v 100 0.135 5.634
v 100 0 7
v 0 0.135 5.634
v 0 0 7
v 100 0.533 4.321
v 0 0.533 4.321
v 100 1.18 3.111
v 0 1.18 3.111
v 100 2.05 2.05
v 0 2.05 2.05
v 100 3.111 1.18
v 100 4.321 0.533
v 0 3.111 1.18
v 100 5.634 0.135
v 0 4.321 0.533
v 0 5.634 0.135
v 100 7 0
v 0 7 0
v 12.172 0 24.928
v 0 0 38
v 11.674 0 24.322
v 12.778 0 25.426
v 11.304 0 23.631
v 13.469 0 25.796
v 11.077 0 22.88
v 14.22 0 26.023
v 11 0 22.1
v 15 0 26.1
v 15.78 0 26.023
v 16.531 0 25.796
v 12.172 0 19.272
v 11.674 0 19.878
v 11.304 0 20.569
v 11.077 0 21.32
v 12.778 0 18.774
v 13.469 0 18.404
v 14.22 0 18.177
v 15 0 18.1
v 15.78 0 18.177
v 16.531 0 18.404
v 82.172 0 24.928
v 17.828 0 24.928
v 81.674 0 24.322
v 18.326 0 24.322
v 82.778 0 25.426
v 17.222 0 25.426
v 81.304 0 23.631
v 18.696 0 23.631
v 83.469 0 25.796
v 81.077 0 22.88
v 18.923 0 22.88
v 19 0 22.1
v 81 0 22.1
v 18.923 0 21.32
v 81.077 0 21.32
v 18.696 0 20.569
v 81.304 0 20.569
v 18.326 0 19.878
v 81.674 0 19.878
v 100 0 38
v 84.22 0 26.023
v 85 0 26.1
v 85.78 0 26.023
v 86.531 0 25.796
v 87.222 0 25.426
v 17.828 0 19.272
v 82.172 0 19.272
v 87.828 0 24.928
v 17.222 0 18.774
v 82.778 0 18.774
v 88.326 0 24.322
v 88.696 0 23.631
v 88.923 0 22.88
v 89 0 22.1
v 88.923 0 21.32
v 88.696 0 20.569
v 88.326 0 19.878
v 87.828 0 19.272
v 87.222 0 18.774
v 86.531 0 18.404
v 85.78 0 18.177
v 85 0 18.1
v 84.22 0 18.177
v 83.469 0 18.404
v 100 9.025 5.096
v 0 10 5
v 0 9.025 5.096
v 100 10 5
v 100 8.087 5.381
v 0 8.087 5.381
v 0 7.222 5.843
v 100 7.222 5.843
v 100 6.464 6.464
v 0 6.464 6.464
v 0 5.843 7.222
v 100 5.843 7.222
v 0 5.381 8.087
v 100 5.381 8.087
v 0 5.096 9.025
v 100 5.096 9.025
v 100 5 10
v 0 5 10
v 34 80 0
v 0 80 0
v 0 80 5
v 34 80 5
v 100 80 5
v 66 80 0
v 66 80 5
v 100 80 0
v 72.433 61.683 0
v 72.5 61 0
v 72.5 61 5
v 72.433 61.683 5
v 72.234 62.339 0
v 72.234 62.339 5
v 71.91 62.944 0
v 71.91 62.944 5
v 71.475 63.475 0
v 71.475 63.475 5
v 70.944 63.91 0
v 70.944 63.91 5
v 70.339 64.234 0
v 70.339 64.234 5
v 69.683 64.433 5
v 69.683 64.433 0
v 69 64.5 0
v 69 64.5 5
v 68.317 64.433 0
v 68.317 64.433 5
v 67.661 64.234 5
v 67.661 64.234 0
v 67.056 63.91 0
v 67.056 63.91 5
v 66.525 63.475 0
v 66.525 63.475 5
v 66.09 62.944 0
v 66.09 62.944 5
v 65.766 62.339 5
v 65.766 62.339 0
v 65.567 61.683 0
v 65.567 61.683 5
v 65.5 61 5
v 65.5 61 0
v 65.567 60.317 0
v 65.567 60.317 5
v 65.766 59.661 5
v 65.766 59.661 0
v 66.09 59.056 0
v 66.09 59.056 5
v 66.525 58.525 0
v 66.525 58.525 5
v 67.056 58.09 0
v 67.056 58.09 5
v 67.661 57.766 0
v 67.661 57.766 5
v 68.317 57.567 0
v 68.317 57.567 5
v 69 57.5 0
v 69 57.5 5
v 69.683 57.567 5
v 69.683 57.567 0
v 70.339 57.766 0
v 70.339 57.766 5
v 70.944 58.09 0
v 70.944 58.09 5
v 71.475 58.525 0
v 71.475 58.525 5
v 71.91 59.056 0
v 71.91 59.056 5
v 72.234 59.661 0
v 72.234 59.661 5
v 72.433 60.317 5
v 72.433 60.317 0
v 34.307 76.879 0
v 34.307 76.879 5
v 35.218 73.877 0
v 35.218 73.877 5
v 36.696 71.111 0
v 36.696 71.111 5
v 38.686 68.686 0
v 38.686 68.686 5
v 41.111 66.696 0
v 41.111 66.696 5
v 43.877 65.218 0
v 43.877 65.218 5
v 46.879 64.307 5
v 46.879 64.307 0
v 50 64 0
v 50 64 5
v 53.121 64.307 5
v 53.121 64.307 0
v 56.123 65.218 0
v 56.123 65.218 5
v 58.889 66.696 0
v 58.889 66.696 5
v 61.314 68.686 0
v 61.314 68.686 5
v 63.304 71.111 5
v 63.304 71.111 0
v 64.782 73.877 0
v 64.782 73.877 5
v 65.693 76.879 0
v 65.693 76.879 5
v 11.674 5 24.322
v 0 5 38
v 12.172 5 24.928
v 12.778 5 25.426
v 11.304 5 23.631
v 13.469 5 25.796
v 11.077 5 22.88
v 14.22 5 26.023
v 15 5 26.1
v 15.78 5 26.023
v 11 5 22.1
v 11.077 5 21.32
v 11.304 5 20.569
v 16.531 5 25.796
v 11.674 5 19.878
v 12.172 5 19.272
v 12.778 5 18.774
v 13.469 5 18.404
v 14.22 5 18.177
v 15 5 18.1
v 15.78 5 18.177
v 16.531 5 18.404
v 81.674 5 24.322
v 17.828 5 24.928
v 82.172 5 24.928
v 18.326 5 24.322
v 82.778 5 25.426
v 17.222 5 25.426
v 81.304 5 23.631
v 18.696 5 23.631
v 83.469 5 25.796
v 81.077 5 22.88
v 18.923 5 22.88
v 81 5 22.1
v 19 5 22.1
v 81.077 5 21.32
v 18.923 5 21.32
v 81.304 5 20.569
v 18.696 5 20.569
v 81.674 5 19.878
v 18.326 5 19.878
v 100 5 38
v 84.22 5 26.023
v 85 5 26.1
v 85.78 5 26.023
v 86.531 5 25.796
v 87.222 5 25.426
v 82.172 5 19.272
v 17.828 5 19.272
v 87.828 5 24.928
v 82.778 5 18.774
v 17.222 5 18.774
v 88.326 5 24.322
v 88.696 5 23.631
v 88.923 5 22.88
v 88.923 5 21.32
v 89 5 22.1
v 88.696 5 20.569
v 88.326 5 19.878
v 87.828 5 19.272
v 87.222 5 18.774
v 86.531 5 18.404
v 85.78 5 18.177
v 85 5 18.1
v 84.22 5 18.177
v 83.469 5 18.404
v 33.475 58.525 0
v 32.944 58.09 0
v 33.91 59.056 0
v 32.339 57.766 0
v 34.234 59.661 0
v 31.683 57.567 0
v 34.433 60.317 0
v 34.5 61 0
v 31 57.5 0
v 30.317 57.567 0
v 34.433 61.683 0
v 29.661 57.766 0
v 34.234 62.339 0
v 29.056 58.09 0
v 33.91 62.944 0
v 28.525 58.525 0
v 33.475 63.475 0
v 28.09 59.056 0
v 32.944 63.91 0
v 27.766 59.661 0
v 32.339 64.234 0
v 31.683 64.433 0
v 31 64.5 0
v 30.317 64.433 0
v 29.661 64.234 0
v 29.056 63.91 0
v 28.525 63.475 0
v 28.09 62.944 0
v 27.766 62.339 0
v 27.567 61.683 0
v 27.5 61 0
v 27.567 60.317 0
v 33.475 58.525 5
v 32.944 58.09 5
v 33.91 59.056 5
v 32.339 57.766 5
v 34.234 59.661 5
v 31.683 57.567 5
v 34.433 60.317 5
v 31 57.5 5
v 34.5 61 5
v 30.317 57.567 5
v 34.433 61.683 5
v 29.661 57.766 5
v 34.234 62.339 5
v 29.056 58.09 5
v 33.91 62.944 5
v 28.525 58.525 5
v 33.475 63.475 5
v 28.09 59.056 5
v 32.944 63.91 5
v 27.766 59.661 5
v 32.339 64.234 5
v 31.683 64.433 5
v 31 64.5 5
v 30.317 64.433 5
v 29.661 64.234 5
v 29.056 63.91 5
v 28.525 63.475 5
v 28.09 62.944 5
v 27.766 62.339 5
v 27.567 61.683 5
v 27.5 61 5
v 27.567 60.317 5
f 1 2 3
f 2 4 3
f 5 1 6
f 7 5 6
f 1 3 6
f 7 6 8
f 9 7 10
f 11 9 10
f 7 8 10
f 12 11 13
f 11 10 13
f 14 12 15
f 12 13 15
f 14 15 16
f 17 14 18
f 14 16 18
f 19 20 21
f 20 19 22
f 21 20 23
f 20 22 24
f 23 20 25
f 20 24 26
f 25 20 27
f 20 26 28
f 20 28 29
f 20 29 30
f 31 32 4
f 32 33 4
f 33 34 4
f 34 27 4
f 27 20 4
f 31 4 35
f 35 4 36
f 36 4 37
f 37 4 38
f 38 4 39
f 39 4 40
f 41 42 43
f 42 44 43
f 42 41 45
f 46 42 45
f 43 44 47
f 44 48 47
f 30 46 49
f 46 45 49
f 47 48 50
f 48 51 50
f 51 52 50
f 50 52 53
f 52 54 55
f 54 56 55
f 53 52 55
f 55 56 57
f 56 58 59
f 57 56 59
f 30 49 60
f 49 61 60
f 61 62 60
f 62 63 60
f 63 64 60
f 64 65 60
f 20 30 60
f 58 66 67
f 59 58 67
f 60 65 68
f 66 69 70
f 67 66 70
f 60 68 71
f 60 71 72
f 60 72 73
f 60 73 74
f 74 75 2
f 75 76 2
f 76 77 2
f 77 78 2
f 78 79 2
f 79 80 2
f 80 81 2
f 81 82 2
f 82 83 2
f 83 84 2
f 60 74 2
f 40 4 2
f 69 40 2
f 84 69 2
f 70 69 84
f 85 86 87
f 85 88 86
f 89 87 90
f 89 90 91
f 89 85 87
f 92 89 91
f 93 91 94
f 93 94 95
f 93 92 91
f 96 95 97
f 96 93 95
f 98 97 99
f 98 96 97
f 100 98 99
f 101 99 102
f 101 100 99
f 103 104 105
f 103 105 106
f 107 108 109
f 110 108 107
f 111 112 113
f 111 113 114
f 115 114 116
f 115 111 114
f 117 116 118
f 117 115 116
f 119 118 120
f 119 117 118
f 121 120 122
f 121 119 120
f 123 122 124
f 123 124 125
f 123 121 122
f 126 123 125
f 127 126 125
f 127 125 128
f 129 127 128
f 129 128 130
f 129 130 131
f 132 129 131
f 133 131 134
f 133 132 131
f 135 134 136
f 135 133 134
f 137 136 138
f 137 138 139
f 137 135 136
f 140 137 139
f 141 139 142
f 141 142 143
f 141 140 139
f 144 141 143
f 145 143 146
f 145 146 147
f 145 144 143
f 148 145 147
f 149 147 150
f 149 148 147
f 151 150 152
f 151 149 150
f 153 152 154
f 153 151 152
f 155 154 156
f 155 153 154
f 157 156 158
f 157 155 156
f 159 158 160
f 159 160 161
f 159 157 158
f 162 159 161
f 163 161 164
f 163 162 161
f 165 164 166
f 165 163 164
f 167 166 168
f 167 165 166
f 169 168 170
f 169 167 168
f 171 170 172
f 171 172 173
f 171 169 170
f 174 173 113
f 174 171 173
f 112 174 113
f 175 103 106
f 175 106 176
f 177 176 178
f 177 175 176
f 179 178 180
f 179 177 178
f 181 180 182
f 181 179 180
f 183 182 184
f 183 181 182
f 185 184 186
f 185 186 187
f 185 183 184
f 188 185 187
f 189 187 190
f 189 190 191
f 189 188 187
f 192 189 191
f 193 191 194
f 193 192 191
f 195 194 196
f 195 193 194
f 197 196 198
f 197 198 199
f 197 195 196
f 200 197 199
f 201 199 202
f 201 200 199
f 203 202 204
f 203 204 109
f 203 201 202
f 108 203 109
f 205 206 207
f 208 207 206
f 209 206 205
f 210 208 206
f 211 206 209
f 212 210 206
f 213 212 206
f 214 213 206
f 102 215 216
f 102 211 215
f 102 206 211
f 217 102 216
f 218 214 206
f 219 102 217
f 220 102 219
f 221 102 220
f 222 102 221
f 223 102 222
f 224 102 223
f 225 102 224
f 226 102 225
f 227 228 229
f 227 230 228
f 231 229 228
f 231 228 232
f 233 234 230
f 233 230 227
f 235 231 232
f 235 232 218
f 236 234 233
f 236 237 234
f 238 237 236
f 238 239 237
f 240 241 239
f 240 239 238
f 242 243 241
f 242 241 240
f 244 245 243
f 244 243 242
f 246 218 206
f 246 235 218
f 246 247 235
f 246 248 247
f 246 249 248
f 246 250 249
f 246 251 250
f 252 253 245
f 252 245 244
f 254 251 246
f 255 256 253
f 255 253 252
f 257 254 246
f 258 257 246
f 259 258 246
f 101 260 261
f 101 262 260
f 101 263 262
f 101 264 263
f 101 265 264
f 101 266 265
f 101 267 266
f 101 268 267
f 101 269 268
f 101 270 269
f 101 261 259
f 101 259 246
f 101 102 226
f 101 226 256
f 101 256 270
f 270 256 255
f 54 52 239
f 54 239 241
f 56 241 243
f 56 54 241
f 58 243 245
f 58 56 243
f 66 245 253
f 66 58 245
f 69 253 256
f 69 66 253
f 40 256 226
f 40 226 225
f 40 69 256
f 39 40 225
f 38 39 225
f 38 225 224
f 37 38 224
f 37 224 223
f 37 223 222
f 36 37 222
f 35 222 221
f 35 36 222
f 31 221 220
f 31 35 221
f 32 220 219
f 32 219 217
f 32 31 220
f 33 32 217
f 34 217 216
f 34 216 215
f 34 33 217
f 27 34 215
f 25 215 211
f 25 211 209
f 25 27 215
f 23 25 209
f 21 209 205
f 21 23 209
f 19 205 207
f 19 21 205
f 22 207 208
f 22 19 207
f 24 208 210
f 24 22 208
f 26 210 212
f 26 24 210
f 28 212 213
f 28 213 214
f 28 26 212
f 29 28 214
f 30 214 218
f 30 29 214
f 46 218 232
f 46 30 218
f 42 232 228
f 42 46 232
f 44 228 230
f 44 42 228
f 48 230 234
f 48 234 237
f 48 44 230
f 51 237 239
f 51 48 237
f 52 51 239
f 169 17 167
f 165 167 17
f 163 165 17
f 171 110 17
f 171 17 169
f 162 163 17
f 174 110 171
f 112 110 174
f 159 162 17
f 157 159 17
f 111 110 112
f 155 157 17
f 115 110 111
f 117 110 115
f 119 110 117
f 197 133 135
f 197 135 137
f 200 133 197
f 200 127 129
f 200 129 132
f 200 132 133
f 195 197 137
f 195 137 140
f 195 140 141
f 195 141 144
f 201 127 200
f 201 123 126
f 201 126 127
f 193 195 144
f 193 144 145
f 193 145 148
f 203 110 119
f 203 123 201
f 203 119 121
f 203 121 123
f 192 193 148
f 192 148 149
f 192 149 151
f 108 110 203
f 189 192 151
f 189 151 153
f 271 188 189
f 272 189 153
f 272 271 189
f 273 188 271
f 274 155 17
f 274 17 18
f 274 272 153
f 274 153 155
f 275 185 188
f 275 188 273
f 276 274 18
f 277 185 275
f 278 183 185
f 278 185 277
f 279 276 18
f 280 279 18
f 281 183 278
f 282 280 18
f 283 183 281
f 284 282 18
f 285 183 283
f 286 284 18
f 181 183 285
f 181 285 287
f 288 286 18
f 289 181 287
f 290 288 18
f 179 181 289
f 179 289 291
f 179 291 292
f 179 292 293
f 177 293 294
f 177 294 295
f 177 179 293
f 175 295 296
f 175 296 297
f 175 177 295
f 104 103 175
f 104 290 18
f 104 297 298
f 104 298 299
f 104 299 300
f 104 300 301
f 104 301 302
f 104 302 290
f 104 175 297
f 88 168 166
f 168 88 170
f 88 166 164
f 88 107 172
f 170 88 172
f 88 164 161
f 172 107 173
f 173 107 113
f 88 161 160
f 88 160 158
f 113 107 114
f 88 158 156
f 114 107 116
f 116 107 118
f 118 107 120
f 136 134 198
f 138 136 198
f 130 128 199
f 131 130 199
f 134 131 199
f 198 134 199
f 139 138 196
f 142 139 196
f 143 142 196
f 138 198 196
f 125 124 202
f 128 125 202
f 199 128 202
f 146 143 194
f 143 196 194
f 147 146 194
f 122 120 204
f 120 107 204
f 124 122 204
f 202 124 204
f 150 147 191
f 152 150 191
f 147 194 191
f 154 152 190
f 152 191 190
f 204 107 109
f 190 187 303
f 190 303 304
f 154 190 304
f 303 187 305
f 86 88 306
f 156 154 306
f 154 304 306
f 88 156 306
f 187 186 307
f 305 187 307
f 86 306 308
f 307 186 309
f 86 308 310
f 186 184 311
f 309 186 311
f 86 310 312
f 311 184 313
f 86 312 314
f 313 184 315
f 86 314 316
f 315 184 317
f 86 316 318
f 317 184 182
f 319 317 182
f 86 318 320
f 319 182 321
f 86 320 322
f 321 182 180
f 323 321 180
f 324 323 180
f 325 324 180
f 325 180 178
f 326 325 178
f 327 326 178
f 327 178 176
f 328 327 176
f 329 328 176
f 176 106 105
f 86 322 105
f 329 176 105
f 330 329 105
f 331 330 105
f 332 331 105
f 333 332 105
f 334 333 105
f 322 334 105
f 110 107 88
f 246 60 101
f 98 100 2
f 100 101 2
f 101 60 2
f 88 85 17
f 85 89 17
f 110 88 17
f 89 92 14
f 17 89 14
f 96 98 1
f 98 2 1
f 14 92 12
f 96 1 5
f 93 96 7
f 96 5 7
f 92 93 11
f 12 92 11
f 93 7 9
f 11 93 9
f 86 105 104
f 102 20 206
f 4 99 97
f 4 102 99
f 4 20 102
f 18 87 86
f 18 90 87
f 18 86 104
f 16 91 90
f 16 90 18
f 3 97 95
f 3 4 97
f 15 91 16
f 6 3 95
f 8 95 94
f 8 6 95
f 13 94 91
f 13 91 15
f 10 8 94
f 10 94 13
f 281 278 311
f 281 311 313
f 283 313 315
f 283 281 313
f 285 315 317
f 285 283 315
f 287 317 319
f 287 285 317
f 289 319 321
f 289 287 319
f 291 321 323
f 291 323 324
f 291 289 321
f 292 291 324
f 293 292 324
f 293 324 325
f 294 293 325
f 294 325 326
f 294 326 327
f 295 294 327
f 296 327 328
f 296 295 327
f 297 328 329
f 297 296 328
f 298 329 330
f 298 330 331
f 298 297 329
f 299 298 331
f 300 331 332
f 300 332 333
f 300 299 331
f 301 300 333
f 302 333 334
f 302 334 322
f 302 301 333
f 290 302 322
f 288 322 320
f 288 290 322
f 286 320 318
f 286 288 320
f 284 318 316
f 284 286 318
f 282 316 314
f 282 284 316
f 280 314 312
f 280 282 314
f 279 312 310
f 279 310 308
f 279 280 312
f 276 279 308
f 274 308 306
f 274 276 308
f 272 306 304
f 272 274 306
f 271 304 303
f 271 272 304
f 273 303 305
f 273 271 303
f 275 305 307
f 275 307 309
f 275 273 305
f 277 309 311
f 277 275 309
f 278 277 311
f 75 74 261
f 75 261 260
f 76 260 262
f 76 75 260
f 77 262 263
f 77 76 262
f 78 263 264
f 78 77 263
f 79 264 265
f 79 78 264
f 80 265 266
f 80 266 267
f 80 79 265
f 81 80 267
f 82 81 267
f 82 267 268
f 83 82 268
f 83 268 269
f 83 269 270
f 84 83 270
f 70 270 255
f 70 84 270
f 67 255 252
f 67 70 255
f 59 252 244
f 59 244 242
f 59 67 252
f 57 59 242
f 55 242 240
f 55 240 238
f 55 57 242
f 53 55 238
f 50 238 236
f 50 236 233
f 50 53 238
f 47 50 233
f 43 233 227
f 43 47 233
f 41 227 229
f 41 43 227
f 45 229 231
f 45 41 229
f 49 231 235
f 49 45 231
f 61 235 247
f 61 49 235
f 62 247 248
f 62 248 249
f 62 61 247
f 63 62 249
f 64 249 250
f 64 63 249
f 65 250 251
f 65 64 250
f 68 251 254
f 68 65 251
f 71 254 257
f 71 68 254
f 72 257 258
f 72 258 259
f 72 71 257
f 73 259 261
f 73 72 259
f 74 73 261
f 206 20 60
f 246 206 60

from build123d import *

# Parameters (mm, degrees)
SCHIZZO1_R                   = 3.5
ESTRUSIONE_ESTRUSIONE1_DEPTH = 5
SCHIZZO3_W                   = 100
SCHIZZO3_H                   = 38
SCHIZZO3_R                   = 4
ESTRUSIONE_ESTRUSIONE2_DEPTH = 5
RACCORDO1_R                  = 5
RACCORDO2_R                  = 7


with BuildPart() as part:
    # Schizzo1 → Estrusione-Estrusione1 (new body)
    with BuildSketch(Plane.XY):
        with BuildLine():
            Line((66, 80), (100, 80))
            Line((100, 80), (100, 0))
            Line((100, 0), (0, 0))
            Line((0, 0), (0, 80))
            Line((0, 80), (34, 80))
            ThreePointArc((34, 80), (50, 64), (66, 80))
        make_face()
        with Locations((31, 61)):
            Circle(SCHIZZO1_R, mode=Mode.SUBTRACT)
        with Locations((69, 61)):
            Circle(SCHIZZO1_R, mode=Mode.SUBTRACT)
    extrude(amount=ESTRUSIONE_ESTRUSIONE1_DEPTH)

    # Schizzo3 → Estrusione-Estrusione2 (add)
    with BuildSketch(Plane(origin=(0, 0, 0), x_dir=(1, 0, 0), z_dir=(0, 1, 0))):
        with Locations((50, -19)):
            Rectangle(SCHIZZO3_W, SCHIZZO3_H)
        with Locations((15, -22.1)):
            Circle(SCHIZZO3_R, mode=Mode.SUBTRACT)
        with Locations((85, -22.1)):
            Circle(SCHIZZO3_R, mode=Mode.SUBTRACT)
    extrude(amount=ESTRUSIONE_ESTRUSIONE2_DEPTH)

    # Raccordo1
    raccordo1_edges = [part.edges().sort_by_distance(p)[0] for p in [
        (50, 5, 5),
    ]]
    fillet(raccordo1_edges, radius=RACCORDO1_R)

    # Raccordo2
    raccordo2_edges = [part.edges().sort_by_distance(p)[0] for p in [
        (50, 0, 0),
    ]]
    fillet(raccordo2_edges, radius=RACCORDO2_R)


solid = part.part
